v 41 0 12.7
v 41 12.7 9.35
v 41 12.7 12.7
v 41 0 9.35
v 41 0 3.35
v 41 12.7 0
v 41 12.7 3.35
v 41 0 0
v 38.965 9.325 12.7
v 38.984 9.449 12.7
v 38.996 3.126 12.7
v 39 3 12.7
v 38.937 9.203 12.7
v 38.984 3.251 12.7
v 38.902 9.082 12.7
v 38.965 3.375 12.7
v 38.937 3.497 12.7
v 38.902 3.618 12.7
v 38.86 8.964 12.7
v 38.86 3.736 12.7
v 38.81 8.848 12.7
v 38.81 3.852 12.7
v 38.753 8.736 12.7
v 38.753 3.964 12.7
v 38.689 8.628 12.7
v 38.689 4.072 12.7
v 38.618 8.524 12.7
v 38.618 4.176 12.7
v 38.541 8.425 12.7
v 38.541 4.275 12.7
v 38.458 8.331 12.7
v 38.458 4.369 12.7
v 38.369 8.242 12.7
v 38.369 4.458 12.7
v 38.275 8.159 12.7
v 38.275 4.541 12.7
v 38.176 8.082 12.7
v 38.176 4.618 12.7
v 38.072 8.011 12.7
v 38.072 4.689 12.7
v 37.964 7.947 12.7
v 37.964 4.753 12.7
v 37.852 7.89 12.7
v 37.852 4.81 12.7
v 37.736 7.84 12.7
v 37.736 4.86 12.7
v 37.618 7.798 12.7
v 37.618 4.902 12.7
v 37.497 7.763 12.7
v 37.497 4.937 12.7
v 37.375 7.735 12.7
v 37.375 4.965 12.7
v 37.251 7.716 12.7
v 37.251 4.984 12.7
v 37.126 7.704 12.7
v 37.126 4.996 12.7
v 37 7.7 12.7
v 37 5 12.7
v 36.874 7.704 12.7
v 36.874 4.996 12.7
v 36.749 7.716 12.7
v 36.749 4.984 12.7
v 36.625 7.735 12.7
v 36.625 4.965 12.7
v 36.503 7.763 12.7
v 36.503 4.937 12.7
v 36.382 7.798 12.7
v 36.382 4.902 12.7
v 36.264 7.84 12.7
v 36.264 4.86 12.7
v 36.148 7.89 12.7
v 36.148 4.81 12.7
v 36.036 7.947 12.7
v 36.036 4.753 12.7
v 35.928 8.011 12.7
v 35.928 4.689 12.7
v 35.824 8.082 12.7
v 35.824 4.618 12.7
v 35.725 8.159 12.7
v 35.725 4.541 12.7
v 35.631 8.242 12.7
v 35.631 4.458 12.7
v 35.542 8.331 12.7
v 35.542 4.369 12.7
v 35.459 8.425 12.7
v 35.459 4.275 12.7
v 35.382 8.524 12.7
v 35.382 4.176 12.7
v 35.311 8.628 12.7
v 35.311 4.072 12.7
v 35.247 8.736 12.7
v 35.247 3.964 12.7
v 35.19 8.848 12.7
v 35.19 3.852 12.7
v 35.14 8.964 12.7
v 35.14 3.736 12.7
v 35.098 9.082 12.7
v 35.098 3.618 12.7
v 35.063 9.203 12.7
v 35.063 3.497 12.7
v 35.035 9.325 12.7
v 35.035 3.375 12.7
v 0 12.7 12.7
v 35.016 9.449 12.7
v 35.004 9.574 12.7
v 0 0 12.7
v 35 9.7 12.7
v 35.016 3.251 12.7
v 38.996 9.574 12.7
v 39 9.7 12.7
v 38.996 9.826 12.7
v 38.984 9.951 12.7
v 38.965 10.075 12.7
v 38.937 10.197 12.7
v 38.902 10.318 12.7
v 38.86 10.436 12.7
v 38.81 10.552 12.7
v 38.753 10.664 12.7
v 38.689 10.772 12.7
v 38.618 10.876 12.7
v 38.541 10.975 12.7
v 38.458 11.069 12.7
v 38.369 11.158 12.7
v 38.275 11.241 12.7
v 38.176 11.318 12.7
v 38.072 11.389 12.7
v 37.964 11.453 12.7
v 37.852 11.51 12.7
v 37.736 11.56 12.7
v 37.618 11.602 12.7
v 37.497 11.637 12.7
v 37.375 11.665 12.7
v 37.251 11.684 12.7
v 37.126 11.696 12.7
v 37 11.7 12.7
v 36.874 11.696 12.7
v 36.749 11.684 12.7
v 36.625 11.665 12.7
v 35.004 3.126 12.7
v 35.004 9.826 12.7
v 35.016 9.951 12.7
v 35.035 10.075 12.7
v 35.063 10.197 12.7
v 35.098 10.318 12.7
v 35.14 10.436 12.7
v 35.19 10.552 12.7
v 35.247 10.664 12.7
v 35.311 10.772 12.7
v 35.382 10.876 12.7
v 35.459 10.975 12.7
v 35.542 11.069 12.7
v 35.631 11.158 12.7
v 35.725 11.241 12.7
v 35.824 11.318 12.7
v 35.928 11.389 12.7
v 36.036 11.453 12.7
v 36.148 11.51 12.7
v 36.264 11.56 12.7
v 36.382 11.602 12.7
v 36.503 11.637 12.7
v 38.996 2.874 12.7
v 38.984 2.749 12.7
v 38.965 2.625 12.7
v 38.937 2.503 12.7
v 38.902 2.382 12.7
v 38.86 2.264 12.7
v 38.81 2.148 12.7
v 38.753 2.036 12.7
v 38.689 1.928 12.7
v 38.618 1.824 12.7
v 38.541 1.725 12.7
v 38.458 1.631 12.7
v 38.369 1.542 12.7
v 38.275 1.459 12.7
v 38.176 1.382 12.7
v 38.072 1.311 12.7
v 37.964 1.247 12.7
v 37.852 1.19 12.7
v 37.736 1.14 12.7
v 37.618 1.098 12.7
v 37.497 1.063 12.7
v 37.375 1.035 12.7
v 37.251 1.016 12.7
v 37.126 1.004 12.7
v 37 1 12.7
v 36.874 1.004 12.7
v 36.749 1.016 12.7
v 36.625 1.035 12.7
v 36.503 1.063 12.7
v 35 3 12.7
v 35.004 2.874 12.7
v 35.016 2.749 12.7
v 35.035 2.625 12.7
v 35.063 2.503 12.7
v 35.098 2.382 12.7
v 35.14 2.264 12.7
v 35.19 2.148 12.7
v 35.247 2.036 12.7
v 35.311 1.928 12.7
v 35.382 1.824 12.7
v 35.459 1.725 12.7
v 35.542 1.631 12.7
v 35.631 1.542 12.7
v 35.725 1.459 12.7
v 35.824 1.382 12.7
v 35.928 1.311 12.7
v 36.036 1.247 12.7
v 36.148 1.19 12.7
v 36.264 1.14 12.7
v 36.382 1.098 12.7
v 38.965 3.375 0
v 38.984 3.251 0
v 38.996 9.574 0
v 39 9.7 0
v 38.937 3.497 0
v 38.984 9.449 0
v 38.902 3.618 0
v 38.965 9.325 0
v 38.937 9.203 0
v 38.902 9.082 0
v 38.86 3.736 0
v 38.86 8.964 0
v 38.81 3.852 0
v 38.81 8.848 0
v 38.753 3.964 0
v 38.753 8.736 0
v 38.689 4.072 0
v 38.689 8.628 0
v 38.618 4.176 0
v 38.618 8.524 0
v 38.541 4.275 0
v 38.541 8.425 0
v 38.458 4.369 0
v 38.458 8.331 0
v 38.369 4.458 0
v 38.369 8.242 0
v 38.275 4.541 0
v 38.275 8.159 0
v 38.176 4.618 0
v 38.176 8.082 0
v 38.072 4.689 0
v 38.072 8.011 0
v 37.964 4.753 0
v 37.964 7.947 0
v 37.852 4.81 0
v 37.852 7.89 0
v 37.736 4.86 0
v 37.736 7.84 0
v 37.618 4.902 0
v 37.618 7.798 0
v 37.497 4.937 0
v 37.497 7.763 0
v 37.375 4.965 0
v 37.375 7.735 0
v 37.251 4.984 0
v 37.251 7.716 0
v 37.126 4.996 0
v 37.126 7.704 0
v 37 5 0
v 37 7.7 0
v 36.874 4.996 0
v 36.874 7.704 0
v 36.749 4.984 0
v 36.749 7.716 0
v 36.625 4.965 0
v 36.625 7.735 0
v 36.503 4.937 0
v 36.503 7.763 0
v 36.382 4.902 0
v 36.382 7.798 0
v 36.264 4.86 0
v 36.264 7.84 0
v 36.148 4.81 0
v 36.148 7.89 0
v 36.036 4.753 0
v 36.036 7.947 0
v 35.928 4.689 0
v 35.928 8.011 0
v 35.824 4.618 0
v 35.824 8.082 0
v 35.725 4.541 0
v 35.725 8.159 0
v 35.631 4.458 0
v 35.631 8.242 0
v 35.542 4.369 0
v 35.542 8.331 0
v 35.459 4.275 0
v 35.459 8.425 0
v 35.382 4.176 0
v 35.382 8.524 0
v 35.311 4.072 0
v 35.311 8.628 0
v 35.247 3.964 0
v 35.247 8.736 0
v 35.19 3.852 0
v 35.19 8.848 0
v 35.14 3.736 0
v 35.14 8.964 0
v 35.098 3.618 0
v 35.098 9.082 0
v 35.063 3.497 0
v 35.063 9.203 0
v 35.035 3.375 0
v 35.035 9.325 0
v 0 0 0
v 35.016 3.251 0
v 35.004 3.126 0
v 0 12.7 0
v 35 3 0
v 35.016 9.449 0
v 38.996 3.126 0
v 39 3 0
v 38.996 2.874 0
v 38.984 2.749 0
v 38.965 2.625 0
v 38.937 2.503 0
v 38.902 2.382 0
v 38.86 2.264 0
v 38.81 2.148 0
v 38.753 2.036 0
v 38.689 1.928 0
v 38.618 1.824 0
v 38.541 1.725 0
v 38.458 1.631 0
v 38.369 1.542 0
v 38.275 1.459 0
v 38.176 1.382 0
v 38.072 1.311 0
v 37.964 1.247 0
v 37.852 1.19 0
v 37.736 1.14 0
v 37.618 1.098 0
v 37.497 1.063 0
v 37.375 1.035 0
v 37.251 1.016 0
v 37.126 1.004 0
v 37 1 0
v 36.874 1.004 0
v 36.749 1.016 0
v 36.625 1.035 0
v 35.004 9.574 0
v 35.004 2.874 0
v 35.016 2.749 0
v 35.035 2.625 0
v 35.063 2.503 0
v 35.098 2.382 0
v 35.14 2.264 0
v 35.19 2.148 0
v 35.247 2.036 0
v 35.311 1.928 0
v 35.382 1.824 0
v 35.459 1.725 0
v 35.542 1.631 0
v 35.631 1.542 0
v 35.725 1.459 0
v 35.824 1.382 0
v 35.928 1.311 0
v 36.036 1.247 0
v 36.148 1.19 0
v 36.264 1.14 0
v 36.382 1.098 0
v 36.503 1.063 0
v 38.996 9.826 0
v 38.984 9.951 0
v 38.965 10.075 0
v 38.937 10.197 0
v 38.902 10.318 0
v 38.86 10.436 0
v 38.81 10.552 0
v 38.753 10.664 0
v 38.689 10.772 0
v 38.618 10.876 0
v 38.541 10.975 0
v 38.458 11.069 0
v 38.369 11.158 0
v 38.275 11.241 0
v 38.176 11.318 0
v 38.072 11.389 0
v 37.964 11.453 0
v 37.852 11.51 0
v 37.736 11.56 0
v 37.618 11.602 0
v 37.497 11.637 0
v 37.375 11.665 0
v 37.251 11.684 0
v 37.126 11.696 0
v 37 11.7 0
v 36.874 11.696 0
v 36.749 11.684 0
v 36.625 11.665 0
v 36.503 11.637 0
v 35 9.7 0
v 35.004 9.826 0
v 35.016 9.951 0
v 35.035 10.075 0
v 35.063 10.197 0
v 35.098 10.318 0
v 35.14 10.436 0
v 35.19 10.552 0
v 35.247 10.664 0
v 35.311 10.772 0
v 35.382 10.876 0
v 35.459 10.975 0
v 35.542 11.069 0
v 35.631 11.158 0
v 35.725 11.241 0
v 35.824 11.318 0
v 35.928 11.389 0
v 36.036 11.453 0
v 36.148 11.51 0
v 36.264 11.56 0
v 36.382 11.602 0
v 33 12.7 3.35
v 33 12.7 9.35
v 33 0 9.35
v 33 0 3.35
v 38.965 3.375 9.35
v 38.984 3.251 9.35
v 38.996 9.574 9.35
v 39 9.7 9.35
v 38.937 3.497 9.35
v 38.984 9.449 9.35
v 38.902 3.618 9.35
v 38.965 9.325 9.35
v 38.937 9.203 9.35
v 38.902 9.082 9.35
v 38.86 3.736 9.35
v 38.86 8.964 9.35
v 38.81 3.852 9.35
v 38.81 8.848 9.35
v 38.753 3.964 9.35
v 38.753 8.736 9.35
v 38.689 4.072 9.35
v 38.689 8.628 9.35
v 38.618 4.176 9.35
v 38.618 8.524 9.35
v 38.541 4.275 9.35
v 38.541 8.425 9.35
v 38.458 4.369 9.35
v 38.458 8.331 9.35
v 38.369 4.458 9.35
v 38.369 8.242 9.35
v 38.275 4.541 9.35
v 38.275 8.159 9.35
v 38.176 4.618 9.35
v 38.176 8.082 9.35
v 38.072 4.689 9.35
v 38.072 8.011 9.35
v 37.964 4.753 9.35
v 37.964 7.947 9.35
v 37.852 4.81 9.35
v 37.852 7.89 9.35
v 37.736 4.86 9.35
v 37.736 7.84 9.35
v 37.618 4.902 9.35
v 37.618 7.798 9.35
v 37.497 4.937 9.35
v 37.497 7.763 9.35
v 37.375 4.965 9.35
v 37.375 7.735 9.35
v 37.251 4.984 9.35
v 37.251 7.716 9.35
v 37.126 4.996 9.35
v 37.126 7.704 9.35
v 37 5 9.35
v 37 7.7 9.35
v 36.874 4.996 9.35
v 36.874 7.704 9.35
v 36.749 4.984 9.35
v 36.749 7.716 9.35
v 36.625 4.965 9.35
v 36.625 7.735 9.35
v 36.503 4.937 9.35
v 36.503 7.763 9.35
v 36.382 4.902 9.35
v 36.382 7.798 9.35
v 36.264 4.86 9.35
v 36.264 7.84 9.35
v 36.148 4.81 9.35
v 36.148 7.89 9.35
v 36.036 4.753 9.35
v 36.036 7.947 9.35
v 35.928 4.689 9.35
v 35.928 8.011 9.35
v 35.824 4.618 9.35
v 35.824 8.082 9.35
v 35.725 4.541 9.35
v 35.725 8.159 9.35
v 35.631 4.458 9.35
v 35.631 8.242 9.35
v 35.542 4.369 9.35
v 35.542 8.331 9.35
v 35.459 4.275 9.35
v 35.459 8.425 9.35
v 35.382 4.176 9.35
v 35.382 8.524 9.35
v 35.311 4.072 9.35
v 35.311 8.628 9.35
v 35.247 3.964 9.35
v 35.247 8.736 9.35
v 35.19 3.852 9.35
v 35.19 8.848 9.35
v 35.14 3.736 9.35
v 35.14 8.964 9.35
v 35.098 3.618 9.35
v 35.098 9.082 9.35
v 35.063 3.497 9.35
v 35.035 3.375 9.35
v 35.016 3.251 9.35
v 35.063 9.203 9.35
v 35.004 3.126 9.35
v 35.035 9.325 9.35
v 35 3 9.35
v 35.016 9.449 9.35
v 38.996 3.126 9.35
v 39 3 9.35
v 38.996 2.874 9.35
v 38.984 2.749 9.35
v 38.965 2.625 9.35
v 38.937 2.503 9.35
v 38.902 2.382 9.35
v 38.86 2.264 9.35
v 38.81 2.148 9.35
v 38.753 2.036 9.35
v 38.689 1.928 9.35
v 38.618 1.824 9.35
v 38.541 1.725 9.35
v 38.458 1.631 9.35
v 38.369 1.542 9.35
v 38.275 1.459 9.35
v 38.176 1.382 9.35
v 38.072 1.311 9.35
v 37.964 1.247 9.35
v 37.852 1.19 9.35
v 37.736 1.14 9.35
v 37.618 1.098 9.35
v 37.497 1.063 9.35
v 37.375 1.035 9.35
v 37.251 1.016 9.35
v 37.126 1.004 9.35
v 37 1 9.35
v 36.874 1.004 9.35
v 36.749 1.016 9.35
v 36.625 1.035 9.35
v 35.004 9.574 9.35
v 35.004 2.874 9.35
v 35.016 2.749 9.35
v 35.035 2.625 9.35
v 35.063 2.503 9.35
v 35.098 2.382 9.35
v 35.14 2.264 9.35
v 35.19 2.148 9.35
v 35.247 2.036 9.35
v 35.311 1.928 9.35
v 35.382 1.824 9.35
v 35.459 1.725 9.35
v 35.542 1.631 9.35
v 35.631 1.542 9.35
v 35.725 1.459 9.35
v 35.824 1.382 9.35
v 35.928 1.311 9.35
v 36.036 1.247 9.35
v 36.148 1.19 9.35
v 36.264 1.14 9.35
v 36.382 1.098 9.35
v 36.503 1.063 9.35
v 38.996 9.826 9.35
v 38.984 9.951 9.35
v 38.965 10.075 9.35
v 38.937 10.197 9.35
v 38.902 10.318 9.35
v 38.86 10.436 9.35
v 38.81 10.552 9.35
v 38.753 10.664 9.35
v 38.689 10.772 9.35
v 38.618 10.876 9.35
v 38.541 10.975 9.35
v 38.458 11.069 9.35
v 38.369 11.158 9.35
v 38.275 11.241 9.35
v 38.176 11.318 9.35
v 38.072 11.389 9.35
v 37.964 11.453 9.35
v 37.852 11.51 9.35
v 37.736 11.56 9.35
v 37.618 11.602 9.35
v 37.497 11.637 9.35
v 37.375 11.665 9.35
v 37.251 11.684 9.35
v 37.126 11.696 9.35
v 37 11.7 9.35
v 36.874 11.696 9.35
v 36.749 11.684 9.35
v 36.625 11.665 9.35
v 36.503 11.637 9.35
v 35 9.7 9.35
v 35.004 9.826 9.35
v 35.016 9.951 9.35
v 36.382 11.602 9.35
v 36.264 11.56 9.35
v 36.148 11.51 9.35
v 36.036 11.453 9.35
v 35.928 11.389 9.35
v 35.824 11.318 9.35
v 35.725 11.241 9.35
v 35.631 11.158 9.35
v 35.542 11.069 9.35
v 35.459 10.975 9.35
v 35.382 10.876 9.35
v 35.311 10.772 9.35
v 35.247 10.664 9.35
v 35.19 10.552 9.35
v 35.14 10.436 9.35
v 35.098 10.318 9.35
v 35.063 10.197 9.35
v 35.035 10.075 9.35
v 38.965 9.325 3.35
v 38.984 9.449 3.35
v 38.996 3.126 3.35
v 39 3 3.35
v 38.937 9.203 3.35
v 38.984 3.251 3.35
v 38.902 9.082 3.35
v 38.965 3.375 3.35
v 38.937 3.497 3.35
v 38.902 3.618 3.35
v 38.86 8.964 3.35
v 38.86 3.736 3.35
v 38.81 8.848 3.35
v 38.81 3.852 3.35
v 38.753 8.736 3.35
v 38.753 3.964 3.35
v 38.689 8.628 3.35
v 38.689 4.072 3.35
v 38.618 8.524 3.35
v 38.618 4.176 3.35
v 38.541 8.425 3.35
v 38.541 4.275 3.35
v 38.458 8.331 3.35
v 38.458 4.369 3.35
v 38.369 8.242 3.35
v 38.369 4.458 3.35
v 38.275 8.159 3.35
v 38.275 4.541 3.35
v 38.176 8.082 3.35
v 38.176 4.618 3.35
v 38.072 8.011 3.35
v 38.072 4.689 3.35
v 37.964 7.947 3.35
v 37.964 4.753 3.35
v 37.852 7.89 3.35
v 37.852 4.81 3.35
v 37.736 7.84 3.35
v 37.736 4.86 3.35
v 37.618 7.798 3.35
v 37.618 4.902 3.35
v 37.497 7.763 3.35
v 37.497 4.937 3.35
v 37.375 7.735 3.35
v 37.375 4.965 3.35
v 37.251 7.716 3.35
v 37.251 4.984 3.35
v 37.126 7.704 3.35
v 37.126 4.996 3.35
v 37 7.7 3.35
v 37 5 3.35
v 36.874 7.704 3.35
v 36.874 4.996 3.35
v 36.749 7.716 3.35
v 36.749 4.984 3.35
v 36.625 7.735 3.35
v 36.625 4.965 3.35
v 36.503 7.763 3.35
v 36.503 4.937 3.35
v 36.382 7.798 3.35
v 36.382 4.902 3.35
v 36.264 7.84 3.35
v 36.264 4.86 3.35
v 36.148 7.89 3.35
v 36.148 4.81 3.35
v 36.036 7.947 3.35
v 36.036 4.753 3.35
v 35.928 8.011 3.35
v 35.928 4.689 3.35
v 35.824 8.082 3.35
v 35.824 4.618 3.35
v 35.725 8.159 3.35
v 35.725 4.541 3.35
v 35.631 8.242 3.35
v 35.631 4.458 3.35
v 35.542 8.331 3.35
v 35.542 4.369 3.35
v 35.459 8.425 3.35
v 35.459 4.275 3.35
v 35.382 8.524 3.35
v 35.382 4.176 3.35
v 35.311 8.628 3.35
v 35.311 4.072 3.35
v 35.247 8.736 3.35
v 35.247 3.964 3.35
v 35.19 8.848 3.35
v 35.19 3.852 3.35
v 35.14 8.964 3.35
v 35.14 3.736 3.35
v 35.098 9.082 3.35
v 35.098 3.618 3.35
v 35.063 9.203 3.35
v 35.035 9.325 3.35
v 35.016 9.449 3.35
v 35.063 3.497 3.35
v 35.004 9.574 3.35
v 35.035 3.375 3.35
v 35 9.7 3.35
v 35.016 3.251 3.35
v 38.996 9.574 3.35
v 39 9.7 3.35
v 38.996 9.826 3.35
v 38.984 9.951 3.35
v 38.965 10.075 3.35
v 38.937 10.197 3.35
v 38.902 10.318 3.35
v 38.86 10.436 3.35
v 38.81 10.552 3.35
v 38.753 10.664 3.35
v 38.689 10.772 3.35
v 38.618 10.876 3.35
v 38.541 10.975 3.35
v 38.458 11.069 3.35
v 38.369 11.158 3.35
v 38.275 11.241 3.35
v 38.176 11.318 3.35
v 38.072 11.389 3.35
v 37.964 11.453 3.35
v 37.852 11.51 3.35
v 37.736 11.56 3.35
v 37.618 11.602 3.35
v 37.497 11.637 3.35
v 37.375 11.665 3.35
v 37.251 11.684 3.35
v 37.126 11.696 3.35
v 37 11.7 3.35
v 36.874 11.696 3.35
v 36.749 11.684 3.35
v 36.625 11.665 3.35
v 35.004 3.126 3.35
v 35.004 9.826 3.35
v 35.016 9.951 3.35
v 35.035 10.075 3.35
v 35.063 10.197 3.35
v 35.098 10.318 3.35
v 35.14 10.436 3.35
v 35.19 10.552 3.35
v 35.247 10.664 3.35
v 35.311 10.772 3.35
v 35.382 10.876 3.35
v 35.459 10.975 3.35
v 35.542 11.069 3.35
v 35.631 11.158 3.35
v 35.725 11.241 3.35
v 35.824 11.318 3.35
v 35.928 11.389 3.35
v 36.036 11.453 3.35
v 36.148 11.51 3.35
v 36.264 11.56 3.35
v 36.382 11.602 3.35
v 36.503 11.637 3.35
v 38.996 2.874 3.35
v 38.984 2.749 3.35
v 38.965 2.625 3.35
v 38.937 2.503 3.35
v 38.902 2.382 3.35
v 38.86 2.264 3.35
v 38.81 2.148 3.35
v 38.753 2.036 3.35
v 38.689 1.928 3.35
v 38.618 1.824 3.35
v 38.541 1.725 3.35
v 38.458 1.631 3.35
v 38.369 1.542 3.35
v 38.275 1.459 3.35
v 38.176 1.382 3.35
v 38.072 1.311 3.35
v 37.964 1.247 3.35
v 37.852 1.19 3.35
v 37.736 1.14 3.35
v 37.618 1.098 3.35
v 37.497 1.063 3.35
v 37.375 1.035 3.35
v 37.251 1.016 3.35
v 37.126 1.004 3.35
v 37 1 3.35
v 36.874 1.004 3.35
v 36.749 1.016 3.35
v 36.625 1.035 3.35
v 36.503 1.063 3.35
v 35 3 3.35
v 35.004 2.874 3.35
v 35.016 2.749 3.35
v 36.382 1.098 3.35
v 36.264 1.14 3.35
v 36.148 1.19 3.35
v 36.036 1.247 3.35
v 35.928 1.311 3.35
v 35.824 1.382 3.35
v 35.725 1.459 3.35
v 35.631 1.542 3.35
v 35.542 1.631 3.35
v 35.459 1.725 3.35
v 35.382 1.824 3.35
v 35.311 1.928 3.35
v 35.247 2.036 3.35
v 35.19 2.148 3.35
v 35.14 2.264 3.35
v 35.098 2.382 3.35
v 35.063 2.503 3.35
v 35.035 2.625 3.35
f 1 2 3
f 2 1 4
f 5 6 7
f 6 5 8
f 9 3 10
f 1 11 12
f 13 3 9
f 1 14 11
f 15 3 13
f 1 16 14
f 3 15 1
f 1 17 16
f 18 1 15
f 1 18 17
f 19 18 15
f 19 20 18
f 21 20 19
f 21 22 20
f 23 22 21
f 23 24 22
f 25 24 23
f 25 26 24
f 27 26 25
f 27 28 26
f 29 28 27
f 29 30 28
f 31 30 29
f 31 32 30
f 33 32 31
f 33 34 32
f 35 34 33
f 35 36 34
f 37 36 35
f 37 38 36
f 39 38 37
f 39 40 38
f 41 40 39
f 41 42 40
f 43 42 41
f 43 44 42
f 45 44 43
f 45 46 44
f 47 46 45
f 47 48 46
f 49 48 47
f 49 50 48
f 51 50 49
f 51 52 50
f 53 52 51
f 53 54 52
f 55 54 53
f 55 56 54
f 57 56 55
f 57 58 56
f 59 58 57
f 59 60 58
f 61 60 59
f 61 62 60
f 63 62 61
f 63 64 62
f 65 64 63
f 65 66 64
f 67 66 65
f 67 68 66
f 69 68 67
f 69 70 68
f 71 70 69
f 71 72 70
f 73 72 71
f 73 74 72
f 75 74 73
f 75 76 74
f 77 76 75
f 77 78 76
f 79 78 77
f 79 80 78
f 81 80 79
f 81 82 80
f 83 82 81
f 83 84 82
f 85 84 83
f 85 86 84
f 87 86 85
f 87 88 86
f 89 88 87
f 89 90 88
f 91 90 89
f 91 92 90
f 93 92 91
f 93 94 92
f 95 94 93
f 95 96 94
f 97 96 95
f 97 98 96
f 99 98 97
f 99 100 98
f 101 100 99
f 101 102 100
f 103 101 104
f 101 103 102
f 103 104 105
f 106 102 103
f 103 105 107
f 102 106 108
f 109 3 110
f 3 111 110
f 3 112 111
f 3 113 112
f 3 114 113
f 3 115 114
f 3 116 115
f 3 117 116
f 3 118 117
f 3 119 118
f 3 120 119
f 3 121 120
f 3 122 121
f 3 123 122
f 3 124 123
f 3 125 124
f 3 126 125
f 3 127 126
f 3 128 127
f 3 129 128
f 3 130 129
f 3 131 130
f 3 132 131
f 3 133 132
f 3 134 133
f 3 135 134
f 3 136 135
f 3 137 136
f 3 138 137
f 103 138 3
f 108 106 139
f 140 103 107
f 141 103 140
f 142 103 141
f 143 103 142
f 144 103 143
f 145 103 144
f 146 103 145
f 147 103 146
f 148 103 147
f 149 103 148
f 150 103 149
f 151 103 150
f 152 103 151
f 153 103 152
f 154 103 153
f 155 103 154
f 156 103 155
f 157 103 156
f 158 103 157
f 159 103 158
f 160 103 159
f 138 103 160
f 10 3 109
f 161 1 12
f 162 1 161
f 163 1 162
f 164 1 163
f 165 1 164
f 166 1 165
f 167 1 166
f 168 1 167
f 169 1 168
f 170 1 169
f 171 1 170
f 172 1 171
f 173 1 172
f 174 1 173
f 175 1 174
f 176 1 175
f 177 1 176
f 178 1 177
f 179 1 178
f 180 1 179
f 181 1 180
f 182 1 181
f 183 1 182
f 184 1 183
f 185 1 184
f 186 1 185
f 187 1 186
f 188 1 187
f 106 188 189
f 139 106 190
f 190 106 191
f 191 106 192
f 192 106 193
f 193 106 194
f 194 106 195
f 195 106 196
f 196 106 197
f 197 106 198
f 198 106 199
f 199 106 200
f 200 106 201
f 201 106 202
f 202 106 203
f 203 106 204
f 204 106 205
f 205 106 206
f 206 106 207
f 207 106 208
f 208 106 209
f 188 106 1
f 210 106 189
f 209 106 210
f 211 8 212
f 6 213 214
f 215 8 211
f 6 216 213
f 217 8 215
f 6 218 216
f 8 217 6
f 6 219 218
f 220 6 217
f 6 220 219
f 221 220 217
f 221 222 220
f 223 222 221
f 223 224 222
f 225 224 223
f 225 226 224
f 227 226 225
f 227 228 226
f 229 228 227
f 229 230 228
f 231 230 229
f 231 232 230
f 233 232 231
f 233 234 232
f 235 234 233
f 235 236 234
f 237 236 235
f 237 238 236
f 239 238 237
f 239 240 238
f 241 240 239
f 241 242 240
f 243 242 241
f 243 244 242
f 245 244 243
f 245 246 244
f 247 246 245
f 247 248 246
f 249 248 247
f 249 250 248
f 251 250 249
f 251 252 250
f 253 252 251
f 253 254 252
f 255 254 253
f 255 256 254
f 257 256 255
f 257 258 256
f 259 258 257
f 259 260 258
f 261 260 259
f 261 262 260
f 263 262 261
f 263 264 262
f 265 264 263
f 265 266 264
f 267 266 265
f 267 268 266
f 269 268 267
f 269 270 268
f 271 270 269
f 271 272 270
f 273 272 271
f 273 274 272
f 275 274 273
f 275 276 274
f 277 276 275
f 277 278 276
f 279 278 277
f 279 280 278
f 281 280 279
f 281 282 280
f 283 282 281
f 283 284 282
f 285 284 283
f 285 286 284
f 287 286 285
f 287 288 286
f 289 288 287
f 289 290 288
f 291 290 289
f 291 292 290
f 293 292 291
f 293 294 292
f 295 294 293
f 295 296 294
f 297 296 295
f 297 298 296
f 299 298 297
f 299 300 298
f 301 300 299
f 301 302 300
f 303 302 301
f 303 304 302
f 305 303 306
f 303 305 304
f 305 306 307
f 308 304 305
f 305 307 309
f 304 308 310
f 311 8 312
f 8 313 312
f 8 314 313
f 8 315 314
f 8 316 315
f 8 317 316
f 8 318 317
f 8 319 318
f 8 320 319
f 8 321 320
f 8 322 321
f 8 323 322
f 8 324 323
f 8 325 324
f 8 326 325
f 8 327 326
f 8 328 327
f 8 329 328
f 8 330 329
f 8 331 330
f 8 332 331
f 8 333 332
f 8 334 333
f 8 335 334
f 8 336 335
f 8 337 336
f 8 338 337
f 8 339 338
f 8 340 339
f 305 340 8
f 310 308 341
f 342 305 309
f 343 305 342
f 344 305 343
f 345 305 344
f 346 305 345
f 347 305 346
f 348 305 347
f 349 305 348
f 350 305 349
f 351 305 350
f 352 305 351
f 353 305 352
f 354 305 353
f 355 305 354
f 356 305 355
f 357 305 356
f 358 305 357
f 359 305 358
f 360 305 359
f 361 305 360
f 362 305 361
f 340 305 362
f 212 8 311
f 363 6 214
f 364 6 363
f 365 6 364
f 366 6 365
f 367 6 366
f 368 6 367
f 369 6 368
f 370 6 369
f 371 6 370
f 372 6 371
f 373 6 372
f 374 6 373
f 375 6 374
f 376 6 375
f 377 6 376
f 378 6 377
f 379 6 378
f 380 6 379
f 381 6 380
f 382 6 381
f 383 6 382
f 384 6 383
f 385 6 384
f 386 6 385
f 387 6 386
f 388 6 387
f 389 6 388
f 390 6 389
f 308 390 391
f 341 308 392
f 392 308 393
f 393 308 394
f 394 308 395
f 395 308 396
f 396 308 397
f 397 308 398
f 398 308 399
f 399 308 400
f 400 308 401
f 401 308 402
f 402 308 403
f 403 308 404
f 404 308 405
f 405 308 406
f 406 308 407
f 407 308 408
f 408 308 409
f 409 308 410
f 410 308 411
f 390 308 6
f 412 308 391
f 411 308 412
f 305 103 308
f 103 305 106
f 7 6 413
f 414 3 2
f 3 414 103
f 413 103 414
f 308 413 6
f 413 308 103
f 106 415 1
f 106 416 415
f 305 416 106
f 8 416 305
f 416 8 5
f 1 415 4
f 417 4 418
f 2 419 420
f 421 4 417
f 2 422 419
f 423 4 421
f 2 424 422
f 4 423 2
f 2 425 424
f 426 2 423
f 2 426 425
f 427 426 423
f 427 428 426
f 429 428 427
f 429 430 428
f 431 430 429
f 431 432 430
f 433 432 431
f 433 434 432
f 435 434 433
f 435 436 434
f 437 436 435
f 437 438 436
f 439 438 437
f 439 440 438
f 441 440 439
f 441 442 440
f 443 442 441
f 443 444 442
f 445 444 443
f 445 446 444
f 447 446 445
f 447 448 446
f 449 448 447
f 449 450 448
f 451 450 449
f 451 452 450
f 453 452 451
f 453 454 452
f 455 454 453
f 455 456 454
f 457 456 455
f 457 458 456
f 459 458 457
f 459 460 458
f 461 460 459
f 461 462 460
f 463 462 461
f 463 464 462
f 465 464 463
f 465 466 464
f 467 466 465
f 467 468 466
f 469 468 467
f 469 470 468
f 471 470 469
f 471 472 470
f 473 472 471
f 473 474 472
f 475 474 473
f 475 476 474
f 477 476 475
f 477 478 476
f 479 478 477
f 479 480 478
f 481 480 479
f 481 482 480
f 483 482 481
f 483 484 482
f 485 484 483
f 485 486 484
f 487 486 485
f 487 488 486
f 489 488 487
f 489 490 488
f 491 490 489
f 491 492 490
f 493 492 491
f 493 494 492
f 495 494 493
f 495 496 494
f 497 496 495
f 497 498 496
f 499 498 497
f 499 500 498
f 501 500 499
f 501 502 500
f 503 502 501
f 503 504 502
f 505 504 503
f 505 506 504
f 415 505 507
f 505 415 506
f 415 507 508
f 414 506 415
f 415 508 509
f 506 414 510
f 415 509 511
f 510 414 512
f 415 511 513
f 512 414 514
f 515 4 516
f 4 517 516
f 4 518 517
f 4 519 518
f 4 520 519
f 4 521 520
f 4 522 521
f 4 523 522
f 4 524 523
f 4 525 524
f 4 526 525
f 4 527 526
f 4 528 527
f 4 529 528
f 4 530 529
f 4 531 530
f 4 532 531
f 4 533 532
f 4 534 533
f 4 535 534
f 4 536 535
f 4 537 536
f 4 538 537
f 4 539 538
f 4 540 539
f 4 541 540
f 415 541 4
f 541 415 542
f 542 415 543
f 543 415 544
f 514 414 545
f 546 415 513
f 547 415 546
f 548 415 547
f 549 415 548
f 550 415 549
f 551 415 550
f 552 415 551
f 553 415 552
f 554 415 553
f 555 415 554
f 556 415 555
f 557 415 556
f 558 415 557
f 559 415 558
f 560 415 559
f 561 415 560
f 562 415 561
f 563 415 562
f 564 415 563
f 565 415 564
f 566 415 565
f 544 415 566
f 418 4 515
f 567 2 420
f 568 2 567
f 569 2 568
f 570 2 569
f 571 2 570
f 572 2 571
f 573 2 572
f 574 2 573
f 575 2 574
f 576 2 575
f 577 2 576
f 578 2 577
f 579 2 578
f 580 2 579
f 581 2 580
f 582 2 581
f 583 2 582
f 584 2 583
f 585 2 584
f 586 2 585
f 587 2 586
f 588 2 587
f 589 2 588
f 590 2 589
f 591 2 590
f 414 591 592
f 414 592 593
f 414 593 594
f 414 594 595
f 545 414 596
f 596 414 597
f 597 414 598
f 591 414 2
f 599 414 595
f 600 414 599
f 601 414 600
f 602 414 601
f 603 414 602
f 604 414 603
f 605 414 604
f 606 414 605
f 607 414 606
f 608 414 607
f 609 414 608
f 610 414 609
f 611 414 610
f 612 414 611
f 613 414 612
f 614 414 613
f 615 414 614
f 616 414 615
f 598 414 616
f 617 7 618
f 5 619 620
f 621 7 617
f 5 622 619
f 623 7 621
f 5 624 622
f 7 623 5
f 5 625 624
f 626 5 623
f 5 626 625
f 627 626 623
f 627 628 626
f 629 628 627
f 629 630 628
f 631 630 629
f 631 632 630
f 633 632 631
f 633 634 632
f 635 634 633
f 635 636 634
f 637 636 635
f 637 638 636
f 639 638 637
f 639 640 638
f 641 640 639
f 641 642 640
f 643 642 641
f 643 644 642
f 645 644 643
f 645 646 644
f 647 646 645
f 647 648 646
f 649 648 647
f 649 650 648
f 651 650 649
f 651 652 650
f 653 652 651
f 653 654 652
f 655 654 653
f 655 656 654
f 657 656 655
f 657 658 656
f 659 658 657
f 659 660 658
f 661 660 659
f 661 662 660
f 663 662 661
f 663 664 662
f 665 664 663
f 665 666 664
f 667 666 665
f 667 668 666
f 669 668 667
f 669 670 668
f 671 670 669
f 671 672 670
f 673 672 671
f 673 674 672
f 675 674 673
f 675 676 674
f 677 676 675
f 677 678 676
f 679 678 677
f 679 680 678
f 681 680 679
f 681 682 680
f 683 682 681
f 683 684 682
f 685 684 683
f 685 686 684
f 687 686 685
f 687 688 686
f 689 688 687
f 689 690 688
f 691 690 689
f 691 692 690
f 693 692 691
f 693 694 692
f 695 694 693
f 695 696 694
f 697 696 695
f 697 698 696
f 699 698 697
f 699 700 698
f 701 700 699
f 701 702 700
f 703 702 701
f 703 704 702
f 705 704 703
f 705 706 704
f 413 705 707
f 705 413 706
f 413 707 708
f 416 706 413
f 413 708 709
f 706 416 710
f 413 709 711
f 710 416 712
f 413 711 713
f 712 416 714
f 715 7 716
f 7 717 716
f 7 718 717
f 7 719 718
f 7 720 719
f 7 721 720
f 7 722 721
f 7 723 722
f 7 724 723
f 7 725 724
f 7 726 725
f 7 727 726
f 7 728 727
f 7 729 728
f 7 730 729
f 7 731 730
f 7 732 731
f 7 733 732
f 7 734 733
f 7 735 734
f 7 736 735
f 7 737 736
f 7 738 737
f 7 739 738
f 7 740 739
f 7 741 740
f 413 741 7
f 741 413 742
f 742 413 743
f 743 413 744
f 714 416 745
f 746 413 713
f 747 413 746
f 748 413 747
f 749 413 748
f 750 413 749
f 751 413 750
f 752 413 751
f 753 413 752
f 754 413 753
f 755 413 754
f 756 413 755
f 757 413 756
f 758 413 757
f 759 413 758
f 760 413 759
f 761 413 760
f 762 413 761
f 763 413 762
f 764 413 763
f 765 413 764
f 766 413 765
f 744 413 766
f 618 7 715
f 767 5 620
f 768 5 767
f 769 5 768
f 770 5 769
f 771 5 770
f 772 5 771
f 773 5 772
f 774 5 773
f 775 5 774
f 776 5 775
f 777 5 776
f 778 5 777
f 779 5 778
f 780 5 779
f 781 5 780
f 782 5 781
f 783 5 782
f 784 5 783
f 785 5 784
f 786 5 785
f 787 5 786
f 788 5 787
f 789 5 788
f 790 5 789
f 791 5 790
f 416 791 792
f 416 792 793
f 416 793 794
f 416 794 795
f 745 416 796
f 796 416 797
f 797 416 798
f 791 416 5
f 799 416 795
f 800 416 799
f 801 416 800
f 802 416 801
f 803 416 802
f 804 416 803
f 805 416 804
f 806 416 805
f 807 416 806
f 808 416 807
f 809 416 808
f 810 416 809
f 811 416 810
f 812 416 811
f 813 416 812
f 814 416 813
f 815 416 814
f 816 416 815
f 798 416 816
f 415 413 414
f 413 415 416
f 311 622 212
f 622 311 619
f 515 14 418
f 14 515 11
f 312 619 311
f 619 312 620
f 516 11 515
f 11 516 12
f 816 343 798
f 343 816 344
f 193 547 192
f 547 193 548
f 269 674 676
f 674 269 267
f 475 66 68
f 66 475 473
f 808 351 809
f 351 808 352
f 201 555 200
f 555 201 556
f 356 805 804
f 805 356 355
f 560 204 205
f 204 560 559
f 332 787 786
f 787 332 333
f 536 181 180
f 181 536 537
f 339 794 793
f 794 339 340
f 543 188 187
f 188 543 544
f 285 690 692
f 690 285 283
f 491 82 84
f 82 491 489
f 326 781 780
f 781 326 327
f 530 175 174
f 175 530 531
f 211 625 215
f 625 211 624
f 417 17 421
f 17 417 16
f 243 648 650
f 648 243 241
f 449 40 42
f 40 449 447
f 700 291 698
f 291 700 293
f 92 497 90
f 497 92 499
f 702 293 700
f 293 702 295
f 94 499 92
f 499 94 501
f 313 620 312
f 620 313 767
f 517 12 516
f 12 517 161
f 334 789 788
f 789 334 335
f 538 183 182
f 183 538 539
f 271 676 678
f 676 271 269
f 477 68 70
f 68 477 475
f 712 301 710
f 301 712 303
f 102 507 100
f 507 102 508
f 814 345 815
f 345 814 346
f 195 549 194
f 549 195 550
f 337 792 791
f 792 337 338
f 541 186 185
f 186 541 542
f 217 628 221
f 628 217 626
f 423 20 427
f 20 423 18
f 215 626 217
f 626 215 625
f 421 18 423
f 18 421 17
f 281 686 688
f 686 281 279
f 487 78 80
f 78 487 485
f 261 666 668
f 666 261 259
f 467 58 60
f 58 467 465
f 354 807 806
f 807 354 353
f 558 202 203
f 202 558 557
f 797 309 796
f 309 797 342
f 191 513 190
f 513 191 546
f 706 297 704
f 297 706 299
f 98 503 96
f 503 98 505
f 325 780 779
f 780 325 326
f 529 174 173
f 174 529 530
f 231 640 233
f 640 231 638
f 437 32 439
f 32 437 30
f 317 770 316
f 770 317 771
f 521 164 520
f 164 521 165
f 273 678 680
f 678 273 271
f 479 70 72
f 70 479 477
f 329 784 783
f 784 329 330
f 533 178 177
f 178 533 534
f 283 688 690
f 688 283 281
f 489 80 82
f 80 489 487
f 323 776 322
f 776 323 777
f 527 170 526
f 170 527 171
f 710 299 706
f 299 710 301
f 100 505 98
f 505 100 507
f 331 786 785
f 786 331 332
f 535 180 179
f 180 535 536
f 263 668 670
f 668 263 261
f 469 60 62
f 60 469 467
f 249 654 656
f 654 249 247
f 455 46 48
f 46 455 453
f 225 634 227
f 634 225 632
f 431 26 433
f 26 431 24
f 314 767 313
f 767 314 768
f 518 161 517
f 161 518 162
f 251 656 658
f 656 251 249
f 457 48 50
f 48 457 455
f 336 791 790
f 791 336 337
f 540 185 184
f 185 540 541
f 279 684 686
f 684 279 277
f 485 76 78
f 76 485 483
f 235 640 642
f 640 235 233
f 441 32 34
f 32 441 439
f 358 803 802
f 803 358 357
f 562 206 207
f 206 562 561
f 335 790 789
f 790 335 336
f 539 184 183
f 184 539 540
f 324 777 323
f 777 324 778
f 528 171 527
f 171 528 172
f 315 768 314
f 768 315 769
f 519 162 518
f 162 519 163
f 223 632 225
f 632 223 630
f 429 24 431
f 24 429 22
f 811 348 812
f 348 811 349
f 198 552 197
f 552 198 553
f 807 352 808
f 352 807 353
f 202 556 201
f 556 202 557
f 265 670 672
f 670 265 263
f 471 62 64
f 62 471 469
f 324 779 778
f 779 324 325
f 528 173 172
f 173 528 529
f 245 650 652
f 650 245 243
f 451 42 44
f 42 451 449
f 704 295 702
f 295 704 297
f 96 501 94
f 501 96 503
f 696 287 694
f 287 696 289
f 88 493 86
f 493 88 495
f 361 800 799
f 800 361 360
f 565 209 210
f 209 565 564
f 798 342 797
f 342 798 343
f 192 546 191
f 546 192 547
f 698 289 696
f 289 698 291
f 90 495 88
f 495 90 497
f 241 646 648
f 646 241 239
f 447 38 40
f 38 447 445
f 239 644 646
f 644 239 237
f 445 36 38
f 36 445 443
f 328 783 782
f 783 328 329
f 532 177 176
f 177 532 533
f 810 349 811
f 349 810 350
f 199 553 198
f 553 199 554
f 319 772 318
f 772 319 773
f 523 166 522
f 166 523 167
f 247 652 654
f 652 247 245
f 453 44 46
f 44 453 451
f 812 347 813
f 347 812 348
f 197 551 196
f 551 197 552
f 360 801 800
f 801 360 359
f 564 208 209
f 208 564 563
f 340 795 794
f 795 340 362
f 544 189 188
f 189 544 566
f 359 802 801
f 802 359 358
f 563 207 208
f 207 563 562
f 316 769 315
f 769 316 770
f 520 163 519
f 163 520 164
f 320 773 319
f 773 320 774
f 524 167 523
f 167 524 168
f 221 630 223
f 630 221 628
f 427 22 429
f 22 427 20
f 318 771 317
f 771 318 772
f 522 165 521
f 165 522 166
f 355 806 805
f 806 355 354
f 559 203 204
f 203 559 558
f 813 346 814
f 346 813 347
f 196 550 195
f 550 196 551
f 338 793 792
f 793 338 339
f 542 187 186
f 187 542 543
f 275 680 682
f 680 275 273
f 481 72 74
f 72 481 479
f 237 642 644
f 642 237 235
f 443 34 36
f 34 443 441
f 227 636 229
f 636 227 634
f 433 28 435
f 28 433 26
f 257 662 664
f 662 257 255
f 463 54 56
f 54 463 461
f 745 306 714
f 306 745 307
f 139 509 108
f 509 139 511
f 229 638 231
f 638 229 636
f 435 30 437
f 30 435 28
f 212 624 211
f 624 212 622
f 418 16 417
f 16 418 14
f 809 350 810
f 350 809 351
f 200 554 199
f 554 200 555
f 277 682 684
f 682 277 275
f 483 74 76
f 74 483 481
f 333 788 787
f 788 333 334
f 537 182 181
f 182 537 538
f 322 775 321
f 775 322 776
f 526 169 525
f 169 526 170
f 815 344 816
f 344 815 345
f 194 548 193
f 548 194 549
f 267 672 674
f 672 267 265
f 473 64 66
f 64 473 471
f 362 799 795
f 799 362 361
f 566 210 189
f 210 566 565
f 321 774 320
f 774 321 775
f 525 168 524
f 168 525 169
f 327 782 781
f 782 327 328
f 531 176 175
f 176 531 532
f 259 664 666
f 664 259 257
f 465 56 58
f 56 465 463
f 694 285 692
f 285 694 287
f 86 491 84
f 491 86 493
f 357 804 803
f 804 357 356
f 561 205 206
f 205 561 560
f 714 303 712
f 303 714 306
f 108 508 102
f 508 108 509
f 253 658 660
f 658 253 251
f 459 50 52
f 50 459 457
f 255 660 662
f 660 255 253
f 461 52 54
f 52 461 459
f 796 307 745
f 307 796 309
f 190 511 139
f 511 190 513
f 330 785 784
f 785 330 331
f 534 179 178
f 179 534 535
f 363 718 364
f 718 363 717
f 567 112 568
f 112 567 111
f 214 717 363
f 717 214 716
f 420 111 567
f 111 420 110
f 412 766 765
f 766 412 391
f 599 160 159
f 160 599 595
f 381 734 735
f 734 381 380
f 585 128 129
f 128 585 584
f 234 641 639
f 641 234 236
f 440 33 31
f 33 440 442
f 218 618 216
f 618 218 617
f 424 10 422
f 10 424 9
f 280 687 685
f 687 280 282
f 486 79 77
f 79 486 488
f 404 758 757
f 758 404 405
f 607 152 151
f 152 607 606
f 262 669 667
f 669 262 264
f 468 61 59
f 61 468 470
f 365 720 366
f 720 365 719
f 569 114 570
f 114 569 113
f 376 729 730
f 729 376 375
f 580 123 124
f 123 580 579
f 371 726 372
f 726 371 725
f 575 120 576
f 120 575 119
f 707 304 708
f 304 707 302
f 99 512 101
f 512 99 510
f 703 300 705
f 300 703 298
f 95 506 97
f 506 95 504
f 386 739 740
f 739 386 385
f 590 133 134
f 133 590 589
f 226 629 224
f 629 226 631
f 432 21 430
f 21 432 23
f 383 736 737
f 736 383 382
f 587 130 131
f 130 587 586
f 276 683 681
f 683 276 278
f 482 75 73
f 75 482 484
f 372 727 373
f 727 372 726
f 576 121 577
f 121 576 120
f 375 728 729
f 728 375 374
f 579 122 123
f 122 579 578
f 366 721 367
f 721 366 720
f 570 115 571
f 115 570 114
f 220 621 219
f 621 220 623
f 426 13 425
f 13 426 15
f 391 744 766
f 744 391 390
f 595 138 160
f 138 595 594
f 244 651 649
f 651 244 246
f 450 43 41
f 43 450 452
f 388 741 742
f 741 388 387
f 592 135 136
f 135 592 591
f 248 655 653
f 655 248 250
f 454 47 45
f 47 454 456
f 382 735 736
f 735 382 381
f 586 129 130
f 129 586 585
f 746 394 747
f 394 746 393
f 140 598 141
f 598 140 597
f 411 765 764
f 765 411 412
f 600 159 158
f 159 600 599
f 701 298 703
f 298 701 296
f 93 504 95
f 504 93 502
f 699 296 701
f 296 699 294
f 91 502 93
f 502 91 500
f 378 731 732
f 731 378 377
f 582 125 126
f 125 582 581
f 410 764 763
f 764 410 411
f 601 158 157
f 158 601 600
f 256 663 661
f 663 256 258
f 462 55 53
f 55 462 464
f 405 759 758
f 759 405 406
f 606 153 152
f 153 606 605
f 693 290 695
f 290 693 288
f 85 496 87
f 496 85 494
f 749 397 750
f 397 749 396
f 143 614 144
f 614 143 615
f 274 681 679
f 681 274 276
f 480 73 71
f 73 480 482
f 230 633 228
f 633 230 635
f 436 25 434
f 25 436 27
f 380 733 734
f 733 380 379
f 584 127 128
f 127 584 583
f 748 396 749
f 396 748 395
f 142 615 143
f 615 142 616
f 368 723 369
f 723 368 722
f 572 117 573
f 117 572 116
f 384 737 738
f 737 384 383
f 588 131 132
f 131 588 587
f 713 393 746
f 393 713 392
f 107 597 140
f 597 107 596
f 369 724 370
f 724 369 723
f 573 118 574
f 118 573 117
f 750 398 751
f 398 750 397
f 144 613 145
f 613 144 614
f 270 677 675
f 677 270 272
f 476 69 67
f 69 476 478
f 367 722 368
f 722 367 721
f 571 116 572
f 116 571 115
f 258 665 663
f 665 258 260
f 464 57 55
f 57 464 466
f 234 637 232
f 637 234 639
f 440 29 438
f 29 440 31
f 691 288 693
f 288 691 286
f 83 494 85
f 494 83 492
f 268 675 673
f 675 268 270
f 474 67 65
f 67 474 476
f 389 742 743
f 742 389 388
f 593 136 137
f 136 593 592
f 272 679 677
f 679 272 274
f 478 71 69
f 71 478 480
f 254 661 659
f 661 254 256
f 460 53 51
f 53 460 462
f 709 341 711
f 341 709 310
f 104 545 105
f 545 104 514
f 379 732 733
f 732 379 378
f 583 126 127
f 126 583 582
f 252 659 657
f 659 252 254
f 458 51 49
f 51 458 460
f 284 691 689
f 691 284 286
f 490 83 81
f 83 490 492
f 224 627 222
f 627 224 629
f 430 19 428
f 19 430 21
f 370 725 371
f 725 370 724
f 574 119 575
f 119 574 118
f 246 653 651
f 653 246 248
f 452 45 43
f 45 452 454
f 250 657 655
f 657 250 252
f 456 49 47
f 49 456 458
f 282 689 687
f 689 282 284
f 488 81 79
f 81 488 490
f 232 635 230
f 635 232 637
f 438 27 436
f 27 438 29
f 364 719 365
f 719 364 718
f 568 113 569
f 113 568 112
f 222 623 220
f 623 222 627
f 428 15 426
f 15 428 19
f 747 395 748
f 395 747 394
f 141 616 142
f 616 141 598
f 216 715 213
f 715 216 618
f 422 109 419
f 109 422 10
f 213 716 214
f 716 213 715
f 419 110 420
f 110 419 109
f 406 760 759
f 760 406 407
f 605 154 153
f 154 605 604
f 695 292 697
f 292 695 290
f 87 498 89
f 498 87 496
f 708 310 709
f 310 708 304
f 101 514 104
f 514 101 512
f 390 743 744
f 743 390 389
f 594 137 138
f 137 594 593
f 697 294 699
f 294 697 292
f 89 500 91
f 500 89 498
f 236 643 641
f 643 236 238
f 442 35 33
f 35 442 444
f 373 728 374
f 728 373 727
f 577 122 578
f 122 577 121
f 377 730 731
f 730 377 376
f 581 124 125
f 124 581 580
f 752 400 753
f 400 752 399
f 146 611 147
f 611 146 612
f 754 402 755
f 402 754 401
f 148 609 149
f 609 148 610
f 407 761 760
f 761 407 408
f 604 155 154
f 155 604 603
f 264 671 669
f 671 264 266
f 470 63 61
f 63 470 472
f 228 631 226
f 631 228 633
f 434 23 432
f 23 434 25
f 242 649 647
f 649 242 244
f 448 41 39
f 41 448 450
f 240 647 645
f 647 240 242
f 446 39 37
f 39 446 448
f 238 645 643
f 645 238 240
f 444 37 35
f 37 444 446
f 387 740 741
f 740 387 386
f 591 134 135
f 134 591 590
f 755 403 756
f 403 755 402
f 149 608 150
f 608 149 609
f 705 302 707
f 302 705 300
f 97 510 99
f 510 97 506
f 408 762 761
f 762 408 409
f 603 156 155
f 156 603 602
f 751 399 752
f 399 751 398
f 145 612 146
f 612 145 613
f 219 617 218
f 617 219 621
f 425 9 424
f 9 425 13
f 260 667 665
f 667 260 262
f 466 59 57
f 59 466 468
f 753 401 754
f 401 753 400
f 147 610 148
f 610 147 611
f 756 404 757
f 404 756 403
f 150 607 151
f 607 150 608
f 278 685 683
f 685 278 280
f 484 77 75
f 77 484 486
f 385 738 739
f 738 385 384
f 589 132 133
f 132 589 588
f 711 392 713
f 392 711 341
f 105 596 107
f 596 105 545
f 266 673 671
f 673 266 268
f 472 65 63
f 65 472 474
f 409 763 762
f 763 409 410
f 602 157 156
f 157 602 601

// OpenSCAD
radius_clamp = 6.45;
radius_clamp_outer = 10;
width_loadcell = 12.7;
height_loadcell = 12.7;
length_loadcell = 80;
height_bearing = 32.5;
width_stand = 40;
length_stand_front_base = 26;
length_stand_front_main = 15;
overhang_loadcell = 5;
length_stand_rear = length_stand_front_main  - length_loadcell + overhang_loadcell;
height_stand = 100;
height_arm = 18;
length_arm = 65;
gap_loadcell = 9;
fit_loadcell = 5;

motor_radius = 18.305;

$fn = 100;
new_loadcell_height = 6;
new_loadcell_radius = 2;

module small_lc_bracket() {
  difference() {
    cube([length_loadcell-47+8, width_loadcell, height_loadcell]);
    translate([length_loadcell-47, -1, (height_loadcell-new_loadcell_height)/2]) cube([10, width_loadcell+2, new_loadcell_height]);
    translate([length_loadcell-47+4, 3, -1]) cylinder(r=2, h=15);
    translate([length_loadcell-47+4, width_loadcell-3, -1]) cylinder(r=2, h=15);
  }
}

small_lc_bracket();
